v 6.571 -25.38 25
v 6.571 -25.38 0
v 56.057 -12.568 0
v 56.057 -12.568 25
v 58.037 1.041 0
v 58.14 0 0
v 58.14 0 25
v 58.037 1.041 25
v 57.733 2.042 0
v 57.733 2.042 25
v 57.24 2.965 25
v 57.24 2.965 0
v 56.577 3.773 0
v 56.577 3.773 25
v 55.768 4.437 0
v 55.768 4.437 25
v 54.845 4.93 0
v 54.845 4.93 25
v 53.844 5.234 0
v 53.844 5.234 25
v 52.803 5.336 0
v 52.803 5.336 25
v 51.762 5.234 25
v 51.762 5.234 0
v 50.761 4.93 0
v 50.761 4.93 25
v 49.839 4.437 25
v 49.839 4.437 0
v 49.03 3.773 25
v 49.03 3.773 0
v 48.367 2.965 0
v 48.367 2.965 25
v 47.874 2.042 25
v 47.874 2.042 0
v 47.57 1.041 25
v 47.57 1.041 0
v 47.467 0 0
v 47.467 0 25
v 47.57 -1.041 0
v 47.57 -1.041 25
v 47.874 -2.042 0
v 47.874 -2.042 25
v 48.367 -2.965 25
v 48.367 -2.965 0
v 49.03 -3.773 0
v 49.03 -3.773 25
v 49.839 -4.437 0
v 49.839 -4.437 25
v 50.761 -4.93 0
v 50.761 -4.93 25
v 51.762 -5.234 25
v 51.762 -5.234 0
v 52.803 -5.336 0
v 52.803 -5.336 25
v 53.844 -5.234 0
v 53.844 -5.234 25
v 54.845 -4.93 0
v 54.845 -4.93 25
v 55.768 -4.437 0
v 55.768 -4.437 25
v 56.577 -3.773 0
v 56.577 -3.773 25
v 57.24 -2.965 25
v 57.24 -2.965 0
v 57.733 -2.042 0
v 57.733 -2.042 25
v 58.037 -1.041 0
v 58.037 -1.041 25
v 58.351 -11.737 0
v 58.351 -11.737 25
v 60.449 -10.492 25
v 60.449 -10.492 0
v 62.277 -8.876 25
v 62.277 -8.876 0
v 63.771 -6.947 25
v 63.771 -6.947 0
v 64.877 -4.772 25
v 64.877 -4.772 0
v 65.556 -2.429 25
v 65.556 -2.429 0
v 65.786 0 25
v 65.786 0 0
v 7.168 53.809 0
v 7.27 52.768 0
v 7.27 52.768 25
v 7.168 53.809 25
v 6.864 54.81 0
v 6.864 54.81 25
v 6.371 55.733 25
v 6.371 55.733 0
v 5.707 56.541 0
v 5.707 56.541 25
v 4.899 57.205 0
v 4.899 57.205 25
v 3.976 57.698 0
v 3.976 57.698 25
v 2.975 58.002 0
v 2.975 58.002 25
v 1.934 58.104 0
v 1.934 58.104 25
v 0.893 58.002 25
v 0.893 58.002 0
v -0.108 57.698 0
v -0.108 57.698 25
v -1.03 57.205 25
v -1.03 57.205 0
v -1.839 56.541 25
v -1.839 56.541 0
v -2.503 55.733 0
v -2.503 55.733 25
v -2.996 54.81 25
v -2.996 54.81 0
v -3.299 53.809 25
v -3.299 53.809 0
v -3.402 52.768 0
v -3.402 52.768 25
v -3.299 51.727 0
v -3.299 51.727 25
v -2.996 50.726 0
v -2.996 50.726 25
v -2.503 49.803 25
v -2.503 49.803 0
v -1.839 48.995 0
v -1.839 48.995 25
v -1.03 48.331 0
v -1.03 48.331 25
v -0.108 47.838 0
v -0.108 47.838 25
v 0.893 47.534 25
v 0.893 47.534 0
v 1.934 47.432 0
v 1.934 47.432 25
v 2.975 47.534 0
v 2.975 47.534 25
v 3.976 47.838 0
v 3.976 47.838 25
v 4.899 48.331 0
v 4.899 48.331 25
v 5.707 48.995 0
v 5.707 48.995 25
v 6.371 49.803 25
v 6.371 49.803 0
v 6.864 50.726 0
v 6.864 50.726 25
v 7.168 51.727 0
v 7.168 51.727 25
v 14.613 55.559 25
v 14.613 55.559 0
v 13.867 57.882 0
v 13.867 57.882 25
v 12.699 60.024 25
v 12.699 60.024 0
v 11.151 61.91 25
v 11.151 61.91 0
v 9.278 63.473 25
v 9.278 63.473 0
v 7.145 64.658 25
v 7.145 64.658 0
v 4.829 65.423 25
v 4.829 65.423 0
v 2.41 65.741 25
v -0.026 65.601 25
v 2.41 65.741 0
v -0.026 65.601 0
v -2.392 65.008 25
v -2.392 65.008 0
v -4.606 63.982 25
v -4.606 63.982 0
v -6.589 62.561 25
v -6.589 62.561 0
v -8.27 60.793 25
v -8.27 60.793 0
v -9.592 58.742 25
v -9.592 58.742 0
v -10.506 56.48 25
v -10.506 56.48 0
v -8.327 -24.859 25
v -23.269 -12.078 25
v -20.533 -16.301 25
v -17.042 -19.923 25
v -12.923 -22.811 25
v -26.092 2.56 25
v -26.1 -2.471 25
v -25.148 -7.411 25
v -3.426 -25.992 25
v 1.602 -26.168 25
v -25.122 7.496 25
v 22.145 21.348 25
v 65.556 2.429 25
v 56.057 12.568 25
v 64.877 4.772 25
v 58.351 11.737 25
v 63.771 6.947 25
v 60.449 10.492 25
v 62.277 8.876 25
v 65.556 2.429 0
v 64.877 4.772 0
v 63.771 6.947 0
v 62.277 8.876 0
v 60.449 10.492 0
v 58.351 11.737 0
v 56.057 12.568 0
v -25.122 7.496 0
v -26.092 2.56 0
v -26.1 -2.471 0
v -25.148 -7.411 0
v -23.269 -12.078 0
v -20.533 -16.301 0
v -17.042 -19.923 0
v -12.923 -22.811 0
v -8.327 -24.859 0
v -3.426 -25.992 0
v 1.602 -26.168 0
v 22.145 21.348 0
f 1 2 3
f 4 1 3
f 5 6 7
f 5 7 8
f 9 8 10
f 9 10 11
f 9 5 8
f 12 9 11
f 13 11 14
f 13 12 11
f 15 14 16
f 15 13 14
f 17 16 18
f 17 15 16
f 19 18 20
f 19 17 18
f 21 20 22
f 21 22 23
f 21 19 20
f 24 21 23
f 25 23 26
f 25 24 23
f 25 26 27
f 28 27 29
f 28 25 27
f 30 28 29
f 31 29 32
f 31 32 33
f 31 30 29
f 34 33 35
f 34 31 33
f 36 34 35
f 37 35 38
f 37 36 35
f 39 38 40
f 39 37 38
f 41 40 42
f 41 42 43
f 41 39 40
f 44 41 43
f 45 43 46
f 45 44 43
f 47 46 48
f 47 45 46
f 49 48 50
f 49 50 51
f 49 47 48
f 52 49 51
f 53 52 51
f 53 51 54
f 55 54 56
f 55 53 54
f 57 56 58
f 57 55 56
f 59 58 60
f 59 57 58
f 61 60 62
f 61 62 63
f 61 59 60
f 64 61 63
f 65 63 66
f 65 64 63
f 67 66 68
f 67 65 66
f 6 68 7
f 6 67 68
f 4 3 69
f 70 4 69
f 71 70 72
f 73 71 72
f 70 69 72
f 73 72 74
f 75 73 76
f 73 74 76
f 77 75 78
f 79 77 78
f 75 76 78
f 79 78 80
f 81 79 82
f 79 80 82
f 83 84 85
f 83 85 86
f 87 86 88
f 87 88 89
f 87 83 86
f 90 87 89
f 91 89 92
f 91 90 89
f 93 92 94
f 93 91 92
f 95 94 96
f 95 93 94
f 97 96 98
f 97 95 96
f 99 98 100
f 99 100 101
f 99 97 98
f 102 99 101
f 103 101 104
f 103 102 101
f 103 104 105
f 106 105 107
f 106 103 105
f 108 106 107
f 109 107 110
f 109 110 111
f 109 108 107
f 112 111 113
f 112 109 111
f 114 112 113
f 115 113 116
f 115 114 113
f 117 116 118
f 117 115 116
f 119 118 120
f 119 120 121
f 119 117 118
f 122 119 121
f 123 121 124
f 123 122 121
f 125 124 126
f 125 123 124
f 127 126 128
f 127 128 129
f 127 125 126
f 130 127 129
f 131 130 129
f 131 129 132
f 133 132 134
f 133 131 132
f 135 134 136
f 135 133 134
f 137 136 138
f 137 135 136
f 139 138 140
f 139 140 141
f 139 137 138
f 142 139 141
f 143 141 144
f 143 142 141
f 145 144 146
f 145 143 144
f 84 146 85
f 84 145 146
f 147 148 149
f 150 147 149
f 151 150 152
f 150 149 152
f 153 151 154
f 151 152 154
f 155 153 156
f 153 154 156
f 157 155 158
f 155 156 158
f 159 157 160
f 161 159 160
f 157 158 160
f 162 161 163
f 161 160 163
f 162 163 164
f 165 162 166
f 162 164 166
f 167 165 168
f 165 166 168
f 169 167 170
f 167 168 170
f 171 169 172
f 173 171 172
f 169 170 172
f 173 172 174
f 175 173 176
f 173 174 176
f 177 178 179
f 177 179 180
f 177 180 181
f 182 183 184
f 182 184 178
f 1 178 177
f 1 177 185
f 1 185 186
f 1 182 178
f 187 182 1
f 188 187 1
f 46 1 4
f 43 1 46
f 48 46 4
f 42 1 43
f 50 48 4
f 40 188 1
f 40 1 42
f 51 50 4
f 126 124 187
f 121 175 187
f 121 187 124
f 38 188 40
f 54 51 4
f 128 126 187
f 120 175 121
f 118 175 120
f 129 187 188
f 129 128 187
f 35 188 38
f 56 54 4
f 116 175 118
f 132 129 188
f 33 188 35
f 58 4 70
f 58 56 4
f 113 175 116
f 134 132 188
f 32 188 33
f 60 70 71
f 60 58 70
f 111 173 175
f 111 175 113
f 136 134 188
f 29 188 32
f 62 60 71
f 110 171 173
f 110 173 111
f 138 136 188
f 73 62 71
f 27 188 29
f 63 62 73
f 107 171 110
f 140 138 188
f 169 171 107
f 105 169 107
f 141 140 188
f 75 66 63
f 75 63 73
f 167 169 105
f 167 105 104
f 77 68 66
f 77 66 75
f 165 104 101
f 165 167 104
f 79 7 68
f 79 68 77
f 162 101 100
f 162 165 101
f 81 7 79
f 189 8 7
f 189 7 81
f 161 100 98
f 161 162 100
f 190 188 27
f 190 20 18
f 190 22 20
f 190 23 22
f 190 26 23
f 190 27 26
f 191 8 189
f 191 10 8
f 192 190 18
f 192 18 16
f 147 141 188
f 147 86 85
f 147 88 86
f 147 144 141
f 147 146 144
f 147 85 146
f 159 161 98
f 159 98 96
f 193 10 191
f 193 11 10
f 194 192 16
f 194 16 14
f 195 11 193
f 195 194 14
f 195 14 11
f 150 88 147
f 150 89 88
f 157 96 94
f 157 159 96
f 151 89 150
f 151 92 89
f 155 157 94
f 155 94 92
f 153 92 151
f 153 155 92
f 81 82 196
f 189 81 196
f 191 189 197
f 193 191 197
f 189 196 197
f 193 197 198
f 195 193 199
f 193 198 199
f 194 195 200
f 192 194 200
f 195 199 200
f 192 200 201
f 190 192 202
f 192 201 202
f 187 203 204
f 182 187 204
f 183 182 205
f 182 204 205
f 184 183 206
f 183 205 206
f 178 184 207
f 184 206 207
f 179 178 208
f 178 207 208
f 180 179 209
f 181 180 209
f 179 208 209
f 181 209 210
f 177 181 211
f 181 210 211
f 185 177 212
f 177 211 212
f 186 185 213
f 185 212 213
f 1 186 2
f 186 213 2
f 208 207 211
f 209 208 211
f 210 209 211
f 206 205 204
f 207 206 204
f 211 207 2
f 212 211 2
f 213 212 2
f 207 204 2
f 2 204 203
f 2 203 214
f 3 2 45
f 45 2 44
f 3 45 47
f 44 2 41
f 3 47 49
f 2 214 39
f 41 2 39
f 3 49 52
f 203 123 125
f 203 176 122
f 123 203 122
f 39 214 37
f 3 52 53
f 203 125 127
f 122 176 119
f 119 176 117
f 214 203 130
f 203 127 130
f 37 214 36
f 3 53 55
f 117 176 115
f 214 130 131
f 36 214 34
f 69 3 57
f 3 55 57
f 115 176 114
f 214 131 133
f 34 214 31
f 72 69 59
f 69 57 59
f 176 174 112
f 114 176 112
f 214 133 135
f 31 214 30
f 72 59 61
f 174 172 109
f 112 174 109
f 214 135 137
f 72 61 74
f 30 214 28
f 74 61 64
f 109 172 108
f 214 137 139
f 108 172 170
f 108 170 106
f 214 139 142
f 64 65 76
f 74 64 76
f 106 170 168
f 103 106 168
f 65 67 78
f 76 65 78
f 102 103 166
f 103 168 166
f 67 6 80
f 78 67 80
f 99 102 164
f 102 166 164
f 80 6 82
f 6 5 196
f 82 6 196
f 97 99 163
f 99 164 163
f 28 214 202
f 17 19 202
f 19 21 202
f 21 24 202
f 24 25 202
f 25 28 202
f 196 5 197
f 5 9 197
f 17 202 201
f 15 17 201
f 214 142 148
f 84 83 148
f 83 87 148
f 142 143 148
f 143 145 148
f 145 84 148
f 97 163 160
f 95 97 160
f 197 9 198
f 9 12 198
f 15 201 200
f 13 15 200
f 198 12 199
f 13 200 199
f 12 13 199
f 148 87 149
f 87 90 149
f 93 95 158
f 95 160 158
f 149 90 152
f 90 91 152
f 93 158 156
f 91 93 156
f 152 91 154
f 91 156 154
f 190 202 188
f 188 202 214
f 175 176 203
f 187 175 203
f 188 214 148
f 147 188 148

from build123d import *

# Parameters (mm, degrees)
F0_R     = 5.3361283698
F1_DEPTH = 25


with BuildPart() as f1:
    # F0 (on Top) → F1 (new body)
    with BuildSketch(Plane.XY):
        with BuildLine():
            ThreePointArc((14.9163241405, 52.7680086499), (14.8401902708, 54.171918287), (14.6126816385, 55.5593614236))
            ThreePointArc((14.6126816385, 55.5593614236), (2.4097380818, 65.741419961), (-10.5058992859, 56.4800777855))
            ThreePointArc((-10.5058992859, 56.4800777855), (0.0584840327, 39.9221055948), (14.9163241405, 52.7680086499))
        make_face()
        with Locations((1.9342003872, 52.7680086499)):
            Circle(F0_R, mode=Mode.SUBTRACT)
        with BuildLine():
            ThreePointArc((-25.1224026689, 7.4964106405), (-12.8838755219, 22.8328062201), (6.5711412686, 25.3801377218))
            Line((6.5711412686, 25.3801377218), (22.1448177539, 21.3479756675))
            Line((22.1448177539, 21.3479756675), (14.6126816385, 55.5593614236))
            ThreePointArc((14.6126816385, 55.5593614236), (14.8401902708, 54.171918287), (14.9163241405, 52.7680086499))
            ThreePointArc((14.9163241405, 52.7680086499), (0.0584840327, 39.9221055948), (-10.5058992859, 56.4800777855))
            Line((-10.5058992859, 56.4800777855), (-25.1224026689, 7.4964106405))
        make_face()
        with BuildLine():
            ThreePointArc((6.5711412686, 25.3801377218), (18.8746968967, 18.1955243235), (25.6038070106, 5.6370519701))
            Line((25.6038070106, 5.6370519701), (22.1448177539, 21.3479756675))
            Line((22.1448177539, 21.3479756675), (6.5711412686, 25.3801377218))
        make_face()
        with BuildLine():
            ThreePointArc((6.5711412686, -25.3801377218), (20.7317018594, -16.0476735499), (26.2170038019, 0))
            ThreePointArc((26.2170038019, 0), (26.0632537693, 2.8351527833), (25.6038070106, 5.6370519701))
            ThreePointArc((25.6038070106, 5.6370519701), (18.8746968967, 18.1955243235), (6.5711412686, 25.3801377218))
            ThreePointArc((6.5711412686, 25.3801377218), (-12.8838755219, 22.8328062201), (-25.1224026689, 7.4964106405))
            ThreePointArc((-25.1224026689, 7.4964106405), (-18.8746968967, -18.1955243235), (6.5711412686, -25.3801377218))
        make_face()
        with BuildLine():
            ThreePointArc((56.0573402856, 12.5677247968), (39.8213218542, 0), (56.0573402856, -12.5677247968))
            ThreePointArc((56.0573402856, -12.5677247968), (63.0693600951, -7.9464795272), (65.7855693607, 0))
            ThreePointArc((65.7855693607, 0), (63.0693600951, 7.9464795272), (56.0573402856, 12.5677247968))
        make_face()
        with Locations((52.8034456074, 0)):
            Circle(F0_R, mode=Mode.SUBTRACT)
        with BuildLine():
            ThreePointArc((25.6038070106, 5.6370519701), (26.0632537693, 2.8351527833), (26.2170038019, 0))
            ThreePointArc((26.2170038019, 0), (20.7317018594, -16.0476735499), (6.5711412686, -25.3801377218))
            Line((6.5711412686, -25.3801377218), (56.0573402856, -12.5677247968))
            ThreePointArc((56.0573402856, -12.5677247968), (39.8213218542, 0), (56.0573402856, 12.5677247968))
            Line((56.0573402856, 12.5677247968), (22.1448177539, 21.3479756675))
            Line((22.1448177539, 21.3479756675), (25.6038070106, 5.6370519701))
        make_face()
    extrude(amount=F1_DEPTH)


solid = f1.part
